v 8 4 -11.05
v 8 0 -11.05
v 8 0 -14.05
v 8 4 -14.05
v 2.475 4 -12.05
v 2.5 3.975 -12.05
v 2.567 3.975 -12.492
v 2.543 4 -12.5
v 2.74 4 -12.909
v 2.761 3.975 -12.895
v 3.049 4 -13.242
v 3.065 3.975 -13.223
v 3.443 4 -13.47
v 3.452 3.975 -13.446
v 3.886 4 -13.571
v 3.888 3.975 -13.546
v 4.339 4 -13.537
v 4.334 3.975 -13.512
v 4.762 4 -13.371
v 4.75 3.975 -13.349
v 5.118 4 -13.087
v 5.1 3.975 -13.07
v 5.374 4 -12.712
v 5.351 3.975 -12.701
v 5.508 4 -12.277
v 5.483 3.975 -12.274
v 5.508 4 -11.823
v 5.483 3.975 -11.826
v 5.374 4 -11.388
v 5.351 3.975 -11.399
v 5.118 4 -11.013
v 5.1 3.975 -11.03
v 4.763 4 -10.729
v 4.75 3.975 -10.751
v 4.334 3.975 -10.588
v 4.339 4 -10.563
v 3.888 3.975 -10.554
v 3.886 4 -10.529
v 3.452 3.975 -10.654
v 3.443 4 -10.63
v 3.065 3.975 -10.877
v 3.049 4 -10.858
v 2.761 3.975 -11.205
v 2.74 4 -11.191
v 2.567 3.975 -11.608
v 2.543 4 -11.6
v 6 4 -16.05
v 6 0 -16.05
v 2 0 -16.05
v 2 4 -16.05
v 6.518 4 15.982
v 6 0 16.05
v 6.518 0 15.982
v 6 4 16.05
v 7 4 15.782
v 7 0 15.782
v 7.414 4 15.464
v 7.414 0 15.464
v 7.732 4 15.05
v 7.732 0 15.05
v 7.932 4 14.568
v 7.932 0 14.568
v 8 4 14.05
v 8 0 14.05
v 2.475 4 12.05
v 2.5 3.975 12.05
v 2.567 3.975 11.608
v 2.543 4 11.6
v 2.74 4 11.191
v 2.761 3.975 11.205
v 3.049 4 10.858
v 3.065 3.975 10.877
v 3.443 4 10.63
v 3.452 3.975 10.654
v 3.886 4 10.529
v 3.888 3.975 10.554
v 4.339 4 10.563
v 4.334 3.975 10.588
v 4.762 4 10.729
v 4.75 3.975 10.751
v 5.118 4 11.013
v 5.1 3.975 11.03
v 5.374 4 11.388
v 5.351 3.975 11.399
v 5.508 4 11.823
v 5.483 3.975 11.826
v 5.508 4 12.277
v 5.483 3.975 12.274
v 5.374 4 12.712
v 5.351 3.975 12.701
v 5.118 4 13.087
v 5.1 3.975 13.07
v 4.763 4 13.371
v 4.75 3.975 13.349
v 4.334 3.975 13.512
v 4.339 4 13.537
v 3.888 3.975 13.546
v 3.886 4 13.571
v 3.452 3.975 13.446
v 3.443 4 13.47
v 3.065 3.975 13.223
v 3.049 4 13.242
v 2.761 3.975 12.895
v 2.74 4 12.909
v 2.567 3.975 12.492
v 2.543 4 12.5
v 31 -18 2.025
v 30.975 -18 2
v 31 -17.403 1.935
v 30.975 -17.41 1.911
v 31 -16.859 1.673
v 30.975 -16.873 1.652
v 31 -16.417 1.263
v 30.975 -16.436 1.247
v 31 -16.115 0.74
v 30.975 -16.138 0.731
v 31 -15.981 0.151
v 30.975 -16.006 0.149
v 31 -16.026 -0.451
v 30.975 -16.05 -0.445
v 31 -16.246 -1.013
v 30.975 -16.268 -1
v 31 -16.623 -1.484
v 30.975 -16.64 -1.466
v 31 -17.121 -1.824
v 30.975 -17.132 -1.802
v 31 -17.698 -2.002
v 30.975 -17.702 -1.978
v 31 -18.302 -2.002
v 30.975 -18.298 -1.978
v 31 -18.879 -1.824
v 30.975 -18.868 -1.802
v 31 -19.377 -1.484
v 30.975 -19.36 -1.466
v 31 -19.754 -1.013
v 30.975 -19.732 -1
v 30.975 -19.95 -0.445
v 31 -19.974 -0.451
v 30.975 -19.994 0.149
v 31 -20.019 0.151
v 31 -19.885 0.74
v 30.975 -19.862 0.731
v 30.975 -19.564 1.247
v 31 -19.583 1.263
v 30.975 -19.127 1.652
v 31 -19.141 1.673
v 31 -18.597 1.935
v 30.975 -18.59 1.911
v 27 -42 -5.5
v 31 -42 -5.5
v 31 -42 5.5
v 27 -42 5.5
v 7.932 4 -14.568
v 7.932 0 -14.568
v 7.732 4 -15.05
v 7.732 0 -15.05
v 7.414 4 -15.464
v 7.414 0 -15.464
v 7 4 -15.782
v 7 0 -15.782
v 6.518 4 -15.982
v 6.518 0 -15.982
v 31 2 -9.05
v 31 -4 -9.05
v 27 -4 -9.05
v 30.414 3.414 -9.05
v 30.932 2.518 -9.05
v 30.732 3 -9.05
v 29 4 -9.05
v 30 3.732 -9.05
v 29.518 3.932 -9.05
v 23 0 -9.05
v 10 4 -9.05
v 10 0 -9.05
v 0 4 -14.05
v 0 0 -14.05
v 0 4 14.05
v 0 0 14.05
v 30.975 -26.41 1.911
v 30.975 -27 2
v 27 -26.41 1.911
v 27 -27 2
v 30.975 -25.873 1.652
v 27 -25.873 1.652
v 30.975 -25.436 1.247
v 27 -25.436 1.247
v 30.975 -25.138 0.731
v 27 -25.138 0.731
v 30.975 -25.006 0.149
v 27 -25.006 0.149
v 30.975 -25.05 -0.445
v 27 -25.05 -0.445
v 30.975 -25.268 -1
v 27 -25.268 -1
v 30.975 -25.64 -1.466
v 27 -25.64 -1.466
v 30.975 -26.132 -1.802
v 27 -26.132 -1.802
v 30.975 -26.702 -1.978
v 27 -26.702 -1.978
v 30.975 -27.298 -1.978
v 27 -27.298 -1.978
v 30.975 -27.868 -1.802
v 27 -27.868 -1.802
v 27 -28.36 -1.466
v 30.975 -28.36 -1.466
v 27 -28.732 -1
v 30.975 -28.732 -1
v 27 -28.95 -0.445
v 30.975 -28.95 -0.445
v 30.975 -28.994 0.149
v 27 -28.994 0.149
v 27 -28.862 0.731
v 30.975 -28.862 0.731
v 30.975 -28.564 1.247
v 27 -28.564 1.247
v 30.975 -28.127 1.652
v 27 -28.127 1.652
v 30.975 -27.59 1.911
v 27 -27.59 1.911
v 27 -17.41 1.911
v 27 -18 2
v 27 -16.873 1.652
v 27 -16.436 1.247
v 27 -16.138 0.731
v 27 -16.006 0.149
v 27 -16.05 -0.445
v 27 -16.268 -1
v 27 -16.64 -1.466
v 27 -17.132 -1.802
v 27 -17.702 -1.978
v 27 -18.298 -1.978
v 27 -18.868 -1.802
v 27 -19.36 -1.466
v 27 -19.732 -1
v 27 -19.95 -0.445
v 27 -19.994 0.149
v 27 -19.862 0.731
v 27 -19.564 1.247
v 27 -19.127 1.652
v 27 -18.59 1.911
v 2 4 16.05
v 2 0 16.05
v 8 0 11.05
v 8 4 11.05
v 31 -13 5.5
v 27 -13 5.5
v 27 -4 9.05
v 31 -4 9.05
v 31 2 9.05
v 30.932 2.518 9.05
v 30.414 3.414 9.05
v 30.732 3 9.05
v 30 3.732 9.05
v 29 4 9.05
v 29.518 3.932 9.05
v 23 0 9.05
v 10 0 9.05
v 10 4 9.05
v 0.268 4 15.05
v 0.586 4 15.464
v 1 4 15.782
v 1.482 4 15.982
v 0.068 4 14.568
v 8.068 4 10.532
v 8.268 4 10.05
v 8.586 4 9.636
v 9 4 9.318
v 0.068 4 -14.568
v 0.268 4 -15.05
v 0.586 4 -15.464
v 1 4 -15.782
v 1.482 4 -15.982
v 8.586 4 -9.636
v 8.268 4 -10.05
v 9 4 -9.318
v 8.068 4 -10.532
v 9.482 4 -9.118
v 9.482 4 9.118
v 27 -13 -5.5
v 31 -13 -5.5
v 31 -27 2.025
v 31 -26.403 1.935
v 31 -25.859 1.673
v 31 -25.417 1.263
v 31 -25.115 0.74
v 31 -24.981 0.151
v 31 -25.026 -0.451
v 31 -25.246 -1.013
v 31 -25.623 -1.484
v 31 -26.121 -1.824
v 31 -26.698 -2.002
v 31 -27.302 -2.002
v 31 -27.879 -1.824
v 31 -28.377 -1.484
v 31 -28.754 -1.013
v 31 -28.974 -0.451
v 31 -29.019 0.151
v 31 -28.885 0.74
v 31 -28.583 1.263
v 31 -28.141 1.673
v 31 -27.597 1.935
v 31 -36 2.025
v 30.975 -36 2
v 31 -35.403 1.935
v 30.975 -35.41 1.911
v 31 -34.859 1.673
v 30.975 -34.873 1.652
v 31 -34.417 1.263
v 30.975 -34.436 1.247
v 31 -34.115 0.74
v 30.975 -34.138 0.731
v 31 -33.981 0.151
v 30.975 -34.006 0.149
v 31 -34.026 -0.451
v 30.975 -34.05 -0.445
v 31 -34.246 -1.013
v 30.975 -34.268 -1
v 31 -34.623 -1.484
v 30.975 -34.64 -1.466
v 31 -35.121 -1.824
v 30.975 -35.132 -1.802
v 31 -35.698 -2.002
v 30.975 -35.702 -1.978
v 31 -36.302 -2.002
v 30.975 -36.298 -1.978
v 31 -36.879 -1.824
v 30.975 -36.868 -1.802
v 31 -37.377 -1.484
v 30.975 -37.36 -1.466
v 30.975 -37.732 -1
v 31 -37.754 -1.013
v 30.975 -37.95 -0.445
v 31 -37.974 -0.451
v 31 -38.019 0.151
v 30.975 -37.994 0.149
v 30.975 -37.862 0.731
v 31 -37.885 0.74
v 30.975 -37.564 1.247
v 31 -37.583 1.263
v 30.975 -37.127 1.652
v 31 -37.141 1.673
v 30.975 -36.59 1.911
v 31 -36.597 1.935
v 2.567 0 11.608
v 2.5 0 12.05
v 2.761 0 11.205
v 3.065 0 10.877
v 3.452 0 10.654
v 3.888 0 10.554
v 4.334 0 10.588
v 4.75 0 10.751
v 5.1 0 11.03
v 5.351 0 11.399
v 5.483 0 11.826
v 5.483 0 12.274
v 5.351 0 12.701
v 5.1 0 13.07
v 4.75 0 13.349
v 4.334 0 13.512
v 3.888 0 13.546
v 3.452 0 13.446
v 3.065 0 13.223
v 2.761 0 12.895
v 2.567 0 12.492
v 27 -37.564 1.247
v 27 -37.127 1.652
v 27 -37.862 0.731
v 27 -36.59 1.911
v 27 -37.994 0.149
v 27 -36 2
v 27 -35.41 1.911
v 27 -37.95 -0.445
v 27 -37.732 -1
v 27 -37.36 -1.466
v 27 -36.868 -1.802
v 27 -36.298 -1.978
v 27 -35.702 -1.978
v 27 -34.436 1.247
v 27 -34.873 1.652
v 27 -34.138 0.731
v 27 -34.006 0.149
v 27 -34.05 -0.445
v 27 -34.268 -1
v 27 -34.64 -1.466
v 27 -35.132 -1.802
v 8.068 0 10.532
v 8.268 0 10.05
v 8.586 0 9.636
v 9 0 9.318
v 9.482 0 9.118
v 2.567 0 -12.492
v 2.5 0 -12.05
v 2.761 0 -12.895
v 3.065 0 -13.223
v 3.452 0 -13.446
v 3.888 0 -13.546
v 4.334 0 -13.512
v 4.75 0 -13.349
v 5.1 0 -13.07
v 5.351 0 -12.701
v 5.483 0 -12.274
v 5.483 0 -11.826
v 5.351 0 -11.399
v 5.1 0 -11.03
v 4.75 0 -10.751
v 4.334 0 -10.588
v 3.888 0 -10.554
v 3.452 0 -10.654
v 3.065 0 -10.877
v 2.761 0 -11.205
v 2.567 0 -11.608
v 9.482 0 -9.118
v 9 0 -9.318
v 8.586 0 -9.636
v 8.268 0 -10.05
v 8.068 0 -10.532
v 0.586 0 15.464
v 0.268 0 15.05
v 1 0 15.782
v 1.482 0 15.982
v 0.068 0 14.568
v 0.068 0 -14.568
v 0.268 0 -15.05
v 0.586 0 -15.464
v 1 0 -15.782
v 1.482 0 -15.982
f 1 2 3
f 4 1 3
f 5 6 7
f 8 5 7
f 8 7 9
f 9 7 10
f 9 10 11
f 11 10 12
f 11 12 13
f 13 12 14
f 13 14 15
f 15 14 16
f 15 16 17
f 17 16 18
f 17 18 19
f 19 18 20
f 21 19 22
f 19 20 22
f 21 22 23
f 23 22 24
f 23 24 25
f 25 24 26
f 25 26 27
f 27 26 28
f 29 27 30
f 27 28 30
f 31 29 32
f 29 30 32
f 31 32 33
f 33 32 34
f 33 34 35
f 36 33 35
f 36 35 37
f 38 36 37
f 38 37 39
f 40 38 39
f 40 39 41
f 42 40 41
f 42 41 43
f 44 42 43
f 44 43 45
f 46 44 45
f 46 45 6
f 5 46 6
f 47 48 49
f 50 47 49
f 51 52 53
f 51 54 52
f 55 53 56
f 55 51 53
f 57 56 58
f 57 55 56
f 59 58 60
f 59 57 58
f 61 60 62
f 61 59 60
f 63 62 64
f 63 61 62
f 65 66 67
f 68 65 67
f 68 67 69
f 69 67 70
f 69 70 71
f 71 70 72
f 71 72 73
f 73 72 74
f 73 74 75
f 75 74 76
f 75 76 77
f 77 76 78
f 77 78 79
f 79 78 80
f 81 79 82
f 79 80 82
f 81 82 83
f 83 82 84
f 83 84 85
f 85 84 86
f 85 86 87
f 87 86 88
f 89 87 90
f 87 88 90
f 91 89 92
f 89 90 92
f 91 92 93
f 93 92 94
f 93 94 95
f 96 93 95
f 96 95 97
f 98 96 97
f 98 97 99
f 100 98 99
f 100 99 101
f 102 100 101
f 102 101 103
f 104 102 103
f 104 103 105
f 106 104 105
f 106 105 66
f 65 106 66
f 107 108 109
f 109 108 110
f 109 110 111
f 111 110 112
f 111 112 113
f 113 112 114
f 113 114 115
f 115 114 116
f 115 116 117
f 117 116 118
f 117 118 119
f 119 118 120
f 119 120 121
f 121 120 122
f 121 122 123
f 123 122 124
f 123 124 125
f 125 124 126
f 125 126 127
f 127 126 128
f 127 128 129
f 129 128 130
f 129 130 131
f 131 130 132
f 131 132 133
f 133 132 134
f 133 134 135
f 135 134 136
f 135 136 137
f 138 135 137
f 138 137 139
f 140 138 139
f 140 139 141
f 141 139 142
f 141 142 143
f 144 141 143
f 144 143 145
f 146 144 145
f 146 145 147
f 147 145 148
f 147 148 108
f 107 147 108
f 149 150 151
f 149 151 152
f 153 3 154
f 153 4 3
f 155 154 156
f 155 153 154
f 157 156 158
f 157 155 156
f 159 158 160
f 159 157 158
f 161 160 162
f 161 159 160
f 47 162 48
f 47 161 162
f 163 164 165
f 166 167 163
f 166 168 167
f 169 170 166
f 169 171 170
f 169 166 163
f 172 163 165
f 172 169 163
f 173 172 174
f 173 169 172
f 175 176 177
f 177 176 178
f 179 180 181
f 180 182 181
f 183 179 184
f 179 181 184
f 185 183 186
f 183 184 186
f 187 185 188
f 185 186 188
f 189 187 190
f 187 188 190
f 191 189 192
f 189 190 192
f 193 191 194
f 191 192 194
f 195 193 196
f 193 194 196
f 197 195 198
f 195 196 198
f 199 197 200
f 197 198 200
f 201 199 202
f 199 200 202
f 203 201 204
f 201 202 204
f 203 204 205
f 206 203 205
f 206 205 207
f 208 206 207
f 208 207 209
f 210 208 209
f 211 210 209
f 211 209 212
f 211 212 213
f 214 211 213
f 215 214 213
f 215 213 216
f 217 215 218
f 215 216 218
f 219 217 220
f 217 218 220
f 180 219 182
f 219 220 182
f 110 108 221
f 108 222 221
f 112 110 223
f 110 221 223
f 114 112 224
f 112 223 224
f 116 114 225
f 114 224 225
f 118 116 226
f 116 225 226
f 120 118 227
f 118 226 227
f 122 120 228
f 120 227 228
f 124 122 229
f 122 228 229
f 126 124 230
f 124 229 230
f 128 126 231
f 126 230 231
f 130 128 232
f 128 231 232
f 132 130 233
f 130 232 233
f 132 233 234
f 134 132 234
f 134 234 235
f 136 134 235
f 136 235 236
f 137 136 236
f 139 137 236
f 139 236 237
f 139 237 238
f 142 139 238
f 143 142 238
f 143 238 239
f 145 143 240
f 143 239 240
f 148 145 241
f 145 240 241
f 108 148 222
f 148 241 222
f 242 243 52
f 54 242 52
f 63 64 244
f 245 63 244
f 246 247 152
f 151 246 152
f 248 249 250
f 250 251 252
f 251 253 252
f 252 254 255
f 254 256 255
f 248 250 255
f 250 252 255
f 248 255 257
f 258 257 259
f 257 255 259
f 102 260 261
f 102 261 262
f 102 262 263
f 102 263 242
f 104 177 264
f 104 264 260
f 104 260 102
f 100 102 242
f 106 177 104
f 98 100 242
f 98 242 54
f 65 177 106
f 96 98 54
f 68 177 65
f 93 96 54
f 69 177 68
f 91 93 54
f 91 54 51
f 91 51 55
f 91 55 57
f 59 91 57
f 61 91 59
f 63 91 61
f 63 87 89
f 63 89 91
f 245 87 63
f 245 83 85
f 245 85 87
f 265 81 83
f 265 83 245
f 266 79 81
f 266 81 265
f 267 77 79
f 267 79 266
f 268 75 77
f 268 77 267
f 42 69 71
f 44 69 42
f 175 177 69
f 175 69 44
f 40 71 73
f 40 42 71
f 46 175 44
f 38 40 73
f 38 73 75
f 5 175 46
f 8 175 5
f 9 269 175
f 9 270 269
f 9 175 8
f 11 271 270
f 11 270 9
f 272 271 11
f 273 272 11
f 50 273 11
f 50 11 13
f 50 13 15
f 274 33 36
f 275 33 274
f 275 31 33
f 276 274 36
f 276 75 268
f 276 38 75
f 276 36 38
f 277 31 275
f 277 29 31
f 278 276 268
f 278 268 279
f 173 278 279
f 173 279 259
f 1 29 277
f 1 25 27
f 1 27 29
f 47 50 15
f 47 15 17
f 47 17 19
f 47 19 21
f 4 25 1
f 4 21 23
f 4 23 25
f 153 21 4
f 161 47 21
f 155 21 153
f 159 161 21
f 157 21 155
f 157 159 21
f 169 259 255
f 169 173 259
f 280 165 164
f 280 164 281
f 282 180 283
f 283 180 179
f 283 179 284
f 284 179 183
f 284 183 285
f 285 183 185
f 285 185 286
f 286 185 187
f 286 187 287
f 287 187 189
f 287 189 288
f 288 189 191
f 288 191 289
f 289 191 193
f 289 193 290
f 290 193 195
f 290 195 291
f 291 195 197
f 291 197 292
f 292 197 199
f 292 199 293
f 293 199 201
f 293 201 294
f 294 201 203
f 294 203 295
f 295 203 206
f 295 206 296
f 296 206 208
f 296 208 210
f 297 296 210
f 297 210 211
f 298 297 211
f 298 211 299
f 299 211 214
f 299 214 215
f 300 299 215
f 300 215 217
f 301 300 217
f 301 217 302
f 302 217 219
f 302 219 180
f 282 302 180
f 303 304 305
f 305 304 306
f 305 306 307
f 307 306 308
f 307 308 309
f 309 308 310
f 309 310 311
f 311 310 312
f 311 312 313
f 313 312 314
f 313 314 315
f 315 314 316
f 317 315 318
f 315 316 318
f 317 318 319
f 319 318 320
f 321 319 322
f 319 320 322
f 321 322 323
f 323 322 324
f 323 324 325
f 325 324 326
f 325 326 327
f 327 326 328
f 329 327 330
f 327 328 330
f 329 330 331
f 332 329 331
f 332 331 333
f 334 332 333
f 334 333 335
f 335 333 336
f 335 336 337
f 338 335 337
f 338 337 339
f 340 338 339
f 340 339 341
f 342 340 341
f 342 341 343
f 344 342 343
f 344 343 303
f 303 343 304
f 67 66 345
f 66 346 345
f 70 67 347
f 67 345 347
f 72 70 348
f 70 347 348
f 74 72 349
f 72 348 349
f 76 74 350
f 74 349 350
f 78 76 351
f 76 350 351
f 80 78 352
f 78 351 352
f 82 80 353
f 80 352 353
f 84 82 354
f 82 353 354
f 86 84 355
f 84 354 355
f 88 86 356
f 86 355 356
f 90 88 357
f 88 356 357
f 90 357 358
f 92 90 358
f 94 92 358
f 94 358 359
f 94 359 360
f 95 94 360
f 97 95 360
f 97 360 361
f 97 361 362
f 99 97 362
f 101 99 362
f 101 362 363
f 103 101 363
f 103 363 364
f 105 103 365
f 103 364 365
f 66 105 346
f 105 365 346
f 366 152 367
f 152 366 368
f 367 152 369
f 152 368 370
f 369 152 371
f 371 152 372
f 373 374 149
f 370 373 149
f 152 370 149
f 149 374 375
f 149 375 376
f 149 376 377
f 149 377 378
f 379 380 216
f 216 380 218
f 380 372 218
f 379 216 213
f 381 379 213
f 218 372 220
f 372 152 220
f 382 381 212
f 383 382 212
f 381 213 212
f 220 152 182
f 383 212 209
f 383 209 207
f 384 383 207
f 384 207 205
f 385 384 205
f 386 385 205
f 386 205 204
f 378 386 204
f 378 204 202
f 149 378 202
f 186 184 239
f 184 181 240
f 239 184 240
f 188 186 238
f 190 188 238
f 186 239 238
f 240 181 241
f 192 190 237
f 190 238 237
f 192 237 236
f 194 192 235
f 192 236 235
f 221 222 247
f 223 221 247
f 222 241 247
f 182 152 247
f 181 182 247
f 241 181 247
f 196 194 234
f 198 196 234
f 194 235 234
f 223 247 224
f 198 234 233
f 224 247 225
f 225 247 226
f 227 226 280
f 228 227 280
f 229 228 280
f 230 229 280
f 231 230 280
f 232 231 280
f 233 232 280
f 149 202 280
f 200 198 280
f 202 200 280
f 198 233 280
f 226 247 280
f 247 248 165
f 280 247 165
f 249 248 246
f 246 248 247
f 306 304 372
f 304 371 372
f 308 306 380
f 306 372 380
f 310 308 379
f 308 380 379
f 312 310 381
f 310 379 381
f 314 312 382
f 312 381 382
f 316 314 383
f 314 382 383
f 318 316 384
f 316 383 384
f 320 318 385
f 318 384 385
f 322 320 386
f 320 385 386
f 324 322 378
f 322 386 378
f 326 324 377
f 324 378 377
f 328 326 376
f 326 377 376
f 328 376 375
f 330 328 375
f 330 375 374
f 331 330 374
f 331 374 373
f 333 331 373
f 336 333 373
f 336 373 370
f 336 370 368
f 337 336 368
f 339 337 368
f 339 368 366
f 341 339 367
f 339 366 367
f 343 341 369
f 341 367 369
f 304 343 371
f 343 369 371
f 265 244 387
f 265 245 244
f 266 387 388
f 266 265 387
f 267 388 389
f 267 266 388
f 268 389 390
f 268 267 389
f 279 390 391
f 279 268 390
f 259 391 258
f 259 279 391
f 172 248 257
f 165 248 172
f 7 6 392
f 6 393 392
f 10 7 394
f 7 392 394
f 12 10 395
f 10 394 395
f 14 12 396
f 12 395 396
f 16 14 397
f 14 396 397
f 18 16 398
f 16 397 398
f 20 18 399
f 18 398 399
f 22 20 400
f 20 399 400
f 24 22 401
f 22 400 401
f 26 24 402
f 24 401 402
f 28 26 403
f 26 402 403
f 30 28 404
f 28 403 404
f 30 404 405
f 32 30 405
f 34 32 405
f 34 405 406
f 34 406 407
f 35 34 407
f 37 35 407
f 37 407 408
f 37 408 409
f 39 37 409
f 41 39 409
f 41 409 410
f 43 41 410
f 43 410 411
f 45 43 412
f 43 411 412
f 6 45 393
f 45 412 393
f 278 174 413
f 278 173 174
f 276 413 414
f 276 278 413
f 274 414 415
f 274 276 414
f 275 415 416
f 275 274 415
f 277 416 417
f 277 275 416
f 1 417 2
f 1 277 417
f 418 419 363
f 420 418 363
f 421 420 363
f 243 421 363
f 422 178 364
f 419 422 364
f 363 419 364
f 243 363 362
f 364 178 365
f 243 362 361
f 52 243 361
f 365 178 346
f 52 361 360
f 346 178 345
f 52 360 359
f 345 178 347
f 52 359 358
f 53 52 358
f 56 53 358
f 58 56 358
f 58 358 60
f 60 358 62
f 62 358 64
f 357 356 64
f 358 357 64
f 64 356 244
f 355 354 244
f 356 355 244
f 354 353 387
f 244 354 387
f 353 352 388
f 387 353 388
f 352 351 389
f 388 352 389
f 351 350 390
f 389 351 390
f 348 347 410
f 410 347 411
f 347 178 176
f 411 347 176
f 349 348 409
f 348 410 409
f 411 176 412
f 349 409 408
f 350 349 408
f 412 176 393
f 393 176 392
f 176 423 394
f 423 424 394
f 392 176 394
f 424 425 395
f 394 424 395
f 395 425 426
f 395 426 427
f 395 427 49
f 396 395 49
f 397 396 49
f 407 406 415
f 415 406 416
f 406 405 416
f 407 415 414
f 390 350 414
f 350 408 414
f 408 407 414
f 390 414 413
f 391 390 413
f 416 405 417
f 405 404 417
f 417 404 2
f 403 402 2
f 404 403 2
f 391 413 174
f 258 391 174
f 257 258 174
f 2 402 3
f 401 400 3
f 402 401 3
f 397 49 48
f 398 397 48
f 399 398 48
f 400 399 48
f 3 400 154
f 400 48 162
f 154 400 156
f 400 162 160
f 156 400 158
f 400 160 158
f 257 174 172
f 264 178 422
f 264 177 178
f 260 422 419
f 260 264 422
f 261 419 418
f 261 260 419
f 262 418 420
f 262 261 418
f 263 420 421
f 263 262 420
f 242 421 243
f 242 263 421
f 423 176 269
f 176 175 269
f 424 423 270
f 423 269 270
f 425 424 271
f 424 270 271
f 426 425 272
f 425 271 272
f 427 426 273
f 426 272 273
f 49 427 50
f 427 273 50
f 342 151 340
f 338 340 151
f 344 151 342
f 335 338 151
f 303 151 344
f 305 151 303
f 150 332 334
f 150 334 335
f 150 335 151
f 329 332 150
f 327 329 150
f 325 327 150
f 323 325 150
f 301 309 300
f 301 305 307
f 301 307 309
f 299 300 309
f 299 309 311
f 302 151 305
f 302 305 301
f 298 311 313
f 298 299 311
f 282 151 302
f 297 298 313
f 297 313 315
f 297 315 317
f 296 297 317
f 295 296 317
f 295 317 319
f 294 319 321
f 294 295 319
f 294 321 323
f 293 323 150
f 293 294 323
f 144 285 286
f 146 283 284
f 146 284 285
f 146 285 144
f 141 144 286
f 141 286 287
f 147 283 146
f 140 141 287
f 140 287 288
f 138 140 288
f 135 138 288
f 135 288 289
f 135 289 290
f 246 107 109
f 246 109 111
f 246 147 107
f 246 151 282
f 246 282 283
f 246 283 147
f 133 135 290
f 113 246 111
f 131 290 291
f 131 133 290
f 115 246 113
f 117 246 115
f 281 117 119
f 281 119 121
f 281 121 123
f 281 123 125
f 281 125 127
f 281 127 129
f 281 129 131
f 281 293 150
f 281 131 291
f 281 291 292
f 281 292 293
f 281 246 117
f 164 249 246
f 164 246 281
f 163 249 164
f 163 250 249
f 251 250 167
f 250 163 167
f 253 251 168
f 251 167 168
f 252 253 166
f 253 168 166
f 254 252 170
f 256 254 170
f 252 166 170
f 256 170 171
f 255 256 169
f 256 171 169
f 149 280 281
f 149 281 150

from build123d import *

# Parameters (mm, degrees)
BOSS_EXTRUDE1_DEPTH             = 4
FILLET1_R                       = 2
F_3_0MM_DOWEL_HOLE1_D           = 3
F_3_0MM_DOWEL_HOLE1_CSINK_D     = 3.05
F_3_0MM_DOWEL_HOLE1_CSINK_ANGLE = 90
SKETCH4_W                       = 4
SKETCH4_H                       = 18.1
BOSS_EXTRUDE2_DEPTH             = 42
CHAMFER1_SIZE                   = 4
FILLET2_R                       = 2
F_4_0MM_DOWEL_HOLE1_D           = 4
F_4_0MM_DOWEL_HOLE1_CSINK_D     = 4.05
F_4_0MM_DOWEL_HOLE1_CSINK_ANGLE = 90
CUT_EXTRUDE1_DEPTH              = 28
CUT_EXTRUDE1_DEPTH_BACK         = 5
CUT_EXTRUDE2_DEPTH              = 28
CUT_EXTRUDE2_DEPTH_BACK         = 5


with BuildPart() as part:
    # Sketch1 → Boss-Extrude1 (new body)
    with BuildSketch(Plane(origin=(0, 0, 0), x_dir=(1, 0, 0), z_dir=(0, 1, 0))):
        Polygon((0, 16.05), (0, -16.05), (8, -16.05), (8, -9.05), (31, -9.05), (31, 9.05), (8, 9.05), (8, 16.05), align=None)
    extrude(amount=BOSS_EXTRUDE1_DEPTH)

    # Fillet1
    fillet1_edges = [part.edges().sort_by_distance(p)[0] for p in [
        (8, 2, -16.05),
        (8, 2, -9.05),
        (8, 2, 9.05),
        (8, 2, 16.05),
        (0, 2, 16.05),
        (0, 2, -16.05),
    ]]
    fillet(fillet1_edges, radius=FILLET1_R)

    # Ø3.0mm Dowel Hole1 (through all)
    with Locations(Plane(origin=(0, 4, 0), x_dir=(1, 0, 0), z_dir=(0, 1, 0))):
        with Locations((4, 12.05), (4, -12.05)):
            CounterSinkHole(F_3_0MM_DOWEL_HOLE1_D / 2, F_3_0MM_DOWEL_HOLE1_CSINK_D / 2, counter_sink_angle=F_3_0MM_DOWEL_HOLE1_CSINK_ANGLE)

    # Sketch4 → Boss-Extrude2 (add)
    with BuildSketch(Plane(origin=(0, 0, 0), x_dir=(-1, 0, 0), z_dir=(0, -1, 0))):
        with Locations((-29, 0)):
            Rectangle(SKETCH4_W, SKETCH4_H)
    extrude(amount=BOSS_EXTRUDE2_DEPTH)

    # Chamfer1
    chamfer1_edges = [part.edges().sort_by_distance(p)[0] for p in [
        (27, 0, 0),
    ]]
    chamfer(chamfer1_edges, length=CHAMFER1_SIZE)

    # Fillet2
    fillet2_edges = [part.edges().sort_by_distance(p)[0] for p in [
        (31, 4, 0),
    ]]
    fillet(fillet2_edges, radius=FILLET2_R)

    # Ø4.0mm Dowel Hole1 (through all)
    with Locations(Plane(origin=(31, 0, 0), x_dir=(0, 0, -1), z_dir=(1, 0, 0))):
        with Locations((0, -36), (0, -27), (0, -18)):
            CounterSinkHole(F_4_0MM_DOWEL_HOLE1_D / 2, F_4_0MM_DOWEL_HOLE1_CSINK_D / 2, counter_sink_angle=F_4_0MM_DOWEL_HOLE1_CSINK_ANGLE)

    # Sketch11 → Cut-Extrude1 (cut, two sides)
    with BuildSketch(Plane.ZY.offset(-27)) as cut_extrude1_sk:
        Polygon((-9.05, -4), (-5.5, -13), (-5.5, -42), (-9.05, -42), align=None)
    extrude(amount=CUT_EXTRUDE1_DEPTH, mode=Mode.SUBTRACT)
    extrude(cut_extrude1_sk.sketch, amount=-CUT_EXTRUDE1_DEPTH_BACK, mode=Mode.SUBTRACT)

    # Sketch12 → Cut-Extrude2 (cut, two sides)
    with BuildSketch(Plane.ZY.offset(-27)) as cut_extrude2_sk:
        Polygon((9.05, -4), (5.5, -13), (5.5, -42), (9.05, -42), align=None)
    extrude(amount=CUT_EXTRUDE2_DEPTH, mode=Mode.SUBTRACT)
    extrude(cut_extrude2_sk.sketch, amount=-CUT_EXTRUDE2_DEPTH_BACK, mode=Mode.SUBTRACT)


solid = part.part
